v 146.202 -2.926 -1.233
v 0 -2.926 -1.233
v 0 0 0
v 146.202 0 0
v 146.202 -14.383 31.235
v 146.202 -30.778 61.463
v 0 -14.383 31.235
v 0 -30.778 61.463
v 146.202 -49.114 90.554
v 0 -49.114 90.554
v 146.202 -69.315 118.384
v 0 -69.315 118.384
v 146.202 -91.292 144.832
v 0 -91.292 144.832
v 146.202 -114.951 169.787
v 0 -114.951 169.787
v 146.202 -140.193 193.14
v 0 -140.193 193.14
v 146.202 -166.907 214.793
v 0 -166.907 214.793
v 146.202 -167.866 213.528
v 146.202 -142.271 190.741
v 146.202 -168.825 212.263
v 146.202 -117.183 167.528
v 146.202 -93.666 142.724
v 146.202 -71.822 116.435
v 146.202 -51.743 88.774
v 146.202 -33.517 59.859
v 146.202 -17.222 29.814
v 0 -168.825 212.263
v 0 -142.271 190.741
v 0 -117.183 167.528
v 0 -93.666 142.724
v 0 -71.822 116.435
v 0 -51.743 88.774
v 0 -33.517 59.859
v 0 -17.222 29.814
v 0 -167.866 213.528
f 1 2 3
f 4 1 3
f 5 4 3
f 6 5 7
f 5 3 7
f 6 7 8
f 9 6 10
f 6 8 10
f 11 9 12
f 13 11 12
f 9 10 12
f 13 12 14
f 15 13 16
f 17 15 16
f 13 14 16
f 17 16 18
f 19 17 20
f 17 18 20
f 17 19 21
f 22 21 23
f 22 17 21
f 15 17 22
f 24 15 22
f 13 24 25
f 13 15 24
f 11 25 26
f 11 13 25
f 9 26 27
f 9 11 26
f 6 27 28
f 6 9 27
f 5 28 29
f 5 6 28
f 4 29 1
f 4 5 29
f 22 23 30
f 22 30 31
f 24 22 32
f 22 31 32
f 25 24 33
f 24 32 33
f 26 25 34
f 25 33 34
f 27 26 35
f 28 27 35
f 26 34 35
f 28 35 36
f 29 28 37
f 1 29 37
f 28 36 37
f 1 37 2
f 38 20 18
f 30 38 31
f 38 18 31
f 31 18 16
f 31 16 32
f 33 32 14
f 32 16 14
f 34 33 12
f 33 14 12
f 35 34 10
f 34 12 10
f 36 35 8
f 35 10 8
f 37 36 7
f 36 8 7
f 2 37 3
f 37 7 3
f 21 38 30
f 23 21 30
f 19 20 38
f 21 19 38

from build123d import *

# Parameters (mm, degrees)
BOSS_EXTRUDE1_DEPTH = 146.2024


with BuildPart() as part:
    # Sketch1 → Boss-Extrude1 (new body)
    with BuildSketch(Plane(origin=(0, 0, 0), x_dir=(0, 0, -1), z_dir=(1, 0, 0))):
        with BuildLine():
            Line((-213.527987278, -167.865893887), (-212.262670256, -168.824606088))
            ThreePointArc((-212.262670256, -168.824606088), (-116.43523539, -71.82151681), (1.233217804, -2.925713414))
            Line((1.233217804, -2.925713414), (0.616608902, -1.462856707))
            ThreePointArc((0.616608902, -1.462856707), (-117.409376916, -70.568039828), (-213.527987278, -167.865893887))
        make_face()
        with BuildLine():
            Line((-214.793304301, -166.907181687), (-213.527987278, -167.865893887))
            ThreePointArc((-213.527987278, -167.865893887), (-117.409376916, -70.568039828), (0.616608902, -1.462856707))
            Line((0.616608902, -1.462856707), (0, 0))
            ThreePointArc((0, 0), (-118.383518443, -69.314562846), (-214.793304301, -166.907181687))
        make_face()
    extrude(amount=BOSS_EXTRUDE1_DEPTH)


solid = part.part
